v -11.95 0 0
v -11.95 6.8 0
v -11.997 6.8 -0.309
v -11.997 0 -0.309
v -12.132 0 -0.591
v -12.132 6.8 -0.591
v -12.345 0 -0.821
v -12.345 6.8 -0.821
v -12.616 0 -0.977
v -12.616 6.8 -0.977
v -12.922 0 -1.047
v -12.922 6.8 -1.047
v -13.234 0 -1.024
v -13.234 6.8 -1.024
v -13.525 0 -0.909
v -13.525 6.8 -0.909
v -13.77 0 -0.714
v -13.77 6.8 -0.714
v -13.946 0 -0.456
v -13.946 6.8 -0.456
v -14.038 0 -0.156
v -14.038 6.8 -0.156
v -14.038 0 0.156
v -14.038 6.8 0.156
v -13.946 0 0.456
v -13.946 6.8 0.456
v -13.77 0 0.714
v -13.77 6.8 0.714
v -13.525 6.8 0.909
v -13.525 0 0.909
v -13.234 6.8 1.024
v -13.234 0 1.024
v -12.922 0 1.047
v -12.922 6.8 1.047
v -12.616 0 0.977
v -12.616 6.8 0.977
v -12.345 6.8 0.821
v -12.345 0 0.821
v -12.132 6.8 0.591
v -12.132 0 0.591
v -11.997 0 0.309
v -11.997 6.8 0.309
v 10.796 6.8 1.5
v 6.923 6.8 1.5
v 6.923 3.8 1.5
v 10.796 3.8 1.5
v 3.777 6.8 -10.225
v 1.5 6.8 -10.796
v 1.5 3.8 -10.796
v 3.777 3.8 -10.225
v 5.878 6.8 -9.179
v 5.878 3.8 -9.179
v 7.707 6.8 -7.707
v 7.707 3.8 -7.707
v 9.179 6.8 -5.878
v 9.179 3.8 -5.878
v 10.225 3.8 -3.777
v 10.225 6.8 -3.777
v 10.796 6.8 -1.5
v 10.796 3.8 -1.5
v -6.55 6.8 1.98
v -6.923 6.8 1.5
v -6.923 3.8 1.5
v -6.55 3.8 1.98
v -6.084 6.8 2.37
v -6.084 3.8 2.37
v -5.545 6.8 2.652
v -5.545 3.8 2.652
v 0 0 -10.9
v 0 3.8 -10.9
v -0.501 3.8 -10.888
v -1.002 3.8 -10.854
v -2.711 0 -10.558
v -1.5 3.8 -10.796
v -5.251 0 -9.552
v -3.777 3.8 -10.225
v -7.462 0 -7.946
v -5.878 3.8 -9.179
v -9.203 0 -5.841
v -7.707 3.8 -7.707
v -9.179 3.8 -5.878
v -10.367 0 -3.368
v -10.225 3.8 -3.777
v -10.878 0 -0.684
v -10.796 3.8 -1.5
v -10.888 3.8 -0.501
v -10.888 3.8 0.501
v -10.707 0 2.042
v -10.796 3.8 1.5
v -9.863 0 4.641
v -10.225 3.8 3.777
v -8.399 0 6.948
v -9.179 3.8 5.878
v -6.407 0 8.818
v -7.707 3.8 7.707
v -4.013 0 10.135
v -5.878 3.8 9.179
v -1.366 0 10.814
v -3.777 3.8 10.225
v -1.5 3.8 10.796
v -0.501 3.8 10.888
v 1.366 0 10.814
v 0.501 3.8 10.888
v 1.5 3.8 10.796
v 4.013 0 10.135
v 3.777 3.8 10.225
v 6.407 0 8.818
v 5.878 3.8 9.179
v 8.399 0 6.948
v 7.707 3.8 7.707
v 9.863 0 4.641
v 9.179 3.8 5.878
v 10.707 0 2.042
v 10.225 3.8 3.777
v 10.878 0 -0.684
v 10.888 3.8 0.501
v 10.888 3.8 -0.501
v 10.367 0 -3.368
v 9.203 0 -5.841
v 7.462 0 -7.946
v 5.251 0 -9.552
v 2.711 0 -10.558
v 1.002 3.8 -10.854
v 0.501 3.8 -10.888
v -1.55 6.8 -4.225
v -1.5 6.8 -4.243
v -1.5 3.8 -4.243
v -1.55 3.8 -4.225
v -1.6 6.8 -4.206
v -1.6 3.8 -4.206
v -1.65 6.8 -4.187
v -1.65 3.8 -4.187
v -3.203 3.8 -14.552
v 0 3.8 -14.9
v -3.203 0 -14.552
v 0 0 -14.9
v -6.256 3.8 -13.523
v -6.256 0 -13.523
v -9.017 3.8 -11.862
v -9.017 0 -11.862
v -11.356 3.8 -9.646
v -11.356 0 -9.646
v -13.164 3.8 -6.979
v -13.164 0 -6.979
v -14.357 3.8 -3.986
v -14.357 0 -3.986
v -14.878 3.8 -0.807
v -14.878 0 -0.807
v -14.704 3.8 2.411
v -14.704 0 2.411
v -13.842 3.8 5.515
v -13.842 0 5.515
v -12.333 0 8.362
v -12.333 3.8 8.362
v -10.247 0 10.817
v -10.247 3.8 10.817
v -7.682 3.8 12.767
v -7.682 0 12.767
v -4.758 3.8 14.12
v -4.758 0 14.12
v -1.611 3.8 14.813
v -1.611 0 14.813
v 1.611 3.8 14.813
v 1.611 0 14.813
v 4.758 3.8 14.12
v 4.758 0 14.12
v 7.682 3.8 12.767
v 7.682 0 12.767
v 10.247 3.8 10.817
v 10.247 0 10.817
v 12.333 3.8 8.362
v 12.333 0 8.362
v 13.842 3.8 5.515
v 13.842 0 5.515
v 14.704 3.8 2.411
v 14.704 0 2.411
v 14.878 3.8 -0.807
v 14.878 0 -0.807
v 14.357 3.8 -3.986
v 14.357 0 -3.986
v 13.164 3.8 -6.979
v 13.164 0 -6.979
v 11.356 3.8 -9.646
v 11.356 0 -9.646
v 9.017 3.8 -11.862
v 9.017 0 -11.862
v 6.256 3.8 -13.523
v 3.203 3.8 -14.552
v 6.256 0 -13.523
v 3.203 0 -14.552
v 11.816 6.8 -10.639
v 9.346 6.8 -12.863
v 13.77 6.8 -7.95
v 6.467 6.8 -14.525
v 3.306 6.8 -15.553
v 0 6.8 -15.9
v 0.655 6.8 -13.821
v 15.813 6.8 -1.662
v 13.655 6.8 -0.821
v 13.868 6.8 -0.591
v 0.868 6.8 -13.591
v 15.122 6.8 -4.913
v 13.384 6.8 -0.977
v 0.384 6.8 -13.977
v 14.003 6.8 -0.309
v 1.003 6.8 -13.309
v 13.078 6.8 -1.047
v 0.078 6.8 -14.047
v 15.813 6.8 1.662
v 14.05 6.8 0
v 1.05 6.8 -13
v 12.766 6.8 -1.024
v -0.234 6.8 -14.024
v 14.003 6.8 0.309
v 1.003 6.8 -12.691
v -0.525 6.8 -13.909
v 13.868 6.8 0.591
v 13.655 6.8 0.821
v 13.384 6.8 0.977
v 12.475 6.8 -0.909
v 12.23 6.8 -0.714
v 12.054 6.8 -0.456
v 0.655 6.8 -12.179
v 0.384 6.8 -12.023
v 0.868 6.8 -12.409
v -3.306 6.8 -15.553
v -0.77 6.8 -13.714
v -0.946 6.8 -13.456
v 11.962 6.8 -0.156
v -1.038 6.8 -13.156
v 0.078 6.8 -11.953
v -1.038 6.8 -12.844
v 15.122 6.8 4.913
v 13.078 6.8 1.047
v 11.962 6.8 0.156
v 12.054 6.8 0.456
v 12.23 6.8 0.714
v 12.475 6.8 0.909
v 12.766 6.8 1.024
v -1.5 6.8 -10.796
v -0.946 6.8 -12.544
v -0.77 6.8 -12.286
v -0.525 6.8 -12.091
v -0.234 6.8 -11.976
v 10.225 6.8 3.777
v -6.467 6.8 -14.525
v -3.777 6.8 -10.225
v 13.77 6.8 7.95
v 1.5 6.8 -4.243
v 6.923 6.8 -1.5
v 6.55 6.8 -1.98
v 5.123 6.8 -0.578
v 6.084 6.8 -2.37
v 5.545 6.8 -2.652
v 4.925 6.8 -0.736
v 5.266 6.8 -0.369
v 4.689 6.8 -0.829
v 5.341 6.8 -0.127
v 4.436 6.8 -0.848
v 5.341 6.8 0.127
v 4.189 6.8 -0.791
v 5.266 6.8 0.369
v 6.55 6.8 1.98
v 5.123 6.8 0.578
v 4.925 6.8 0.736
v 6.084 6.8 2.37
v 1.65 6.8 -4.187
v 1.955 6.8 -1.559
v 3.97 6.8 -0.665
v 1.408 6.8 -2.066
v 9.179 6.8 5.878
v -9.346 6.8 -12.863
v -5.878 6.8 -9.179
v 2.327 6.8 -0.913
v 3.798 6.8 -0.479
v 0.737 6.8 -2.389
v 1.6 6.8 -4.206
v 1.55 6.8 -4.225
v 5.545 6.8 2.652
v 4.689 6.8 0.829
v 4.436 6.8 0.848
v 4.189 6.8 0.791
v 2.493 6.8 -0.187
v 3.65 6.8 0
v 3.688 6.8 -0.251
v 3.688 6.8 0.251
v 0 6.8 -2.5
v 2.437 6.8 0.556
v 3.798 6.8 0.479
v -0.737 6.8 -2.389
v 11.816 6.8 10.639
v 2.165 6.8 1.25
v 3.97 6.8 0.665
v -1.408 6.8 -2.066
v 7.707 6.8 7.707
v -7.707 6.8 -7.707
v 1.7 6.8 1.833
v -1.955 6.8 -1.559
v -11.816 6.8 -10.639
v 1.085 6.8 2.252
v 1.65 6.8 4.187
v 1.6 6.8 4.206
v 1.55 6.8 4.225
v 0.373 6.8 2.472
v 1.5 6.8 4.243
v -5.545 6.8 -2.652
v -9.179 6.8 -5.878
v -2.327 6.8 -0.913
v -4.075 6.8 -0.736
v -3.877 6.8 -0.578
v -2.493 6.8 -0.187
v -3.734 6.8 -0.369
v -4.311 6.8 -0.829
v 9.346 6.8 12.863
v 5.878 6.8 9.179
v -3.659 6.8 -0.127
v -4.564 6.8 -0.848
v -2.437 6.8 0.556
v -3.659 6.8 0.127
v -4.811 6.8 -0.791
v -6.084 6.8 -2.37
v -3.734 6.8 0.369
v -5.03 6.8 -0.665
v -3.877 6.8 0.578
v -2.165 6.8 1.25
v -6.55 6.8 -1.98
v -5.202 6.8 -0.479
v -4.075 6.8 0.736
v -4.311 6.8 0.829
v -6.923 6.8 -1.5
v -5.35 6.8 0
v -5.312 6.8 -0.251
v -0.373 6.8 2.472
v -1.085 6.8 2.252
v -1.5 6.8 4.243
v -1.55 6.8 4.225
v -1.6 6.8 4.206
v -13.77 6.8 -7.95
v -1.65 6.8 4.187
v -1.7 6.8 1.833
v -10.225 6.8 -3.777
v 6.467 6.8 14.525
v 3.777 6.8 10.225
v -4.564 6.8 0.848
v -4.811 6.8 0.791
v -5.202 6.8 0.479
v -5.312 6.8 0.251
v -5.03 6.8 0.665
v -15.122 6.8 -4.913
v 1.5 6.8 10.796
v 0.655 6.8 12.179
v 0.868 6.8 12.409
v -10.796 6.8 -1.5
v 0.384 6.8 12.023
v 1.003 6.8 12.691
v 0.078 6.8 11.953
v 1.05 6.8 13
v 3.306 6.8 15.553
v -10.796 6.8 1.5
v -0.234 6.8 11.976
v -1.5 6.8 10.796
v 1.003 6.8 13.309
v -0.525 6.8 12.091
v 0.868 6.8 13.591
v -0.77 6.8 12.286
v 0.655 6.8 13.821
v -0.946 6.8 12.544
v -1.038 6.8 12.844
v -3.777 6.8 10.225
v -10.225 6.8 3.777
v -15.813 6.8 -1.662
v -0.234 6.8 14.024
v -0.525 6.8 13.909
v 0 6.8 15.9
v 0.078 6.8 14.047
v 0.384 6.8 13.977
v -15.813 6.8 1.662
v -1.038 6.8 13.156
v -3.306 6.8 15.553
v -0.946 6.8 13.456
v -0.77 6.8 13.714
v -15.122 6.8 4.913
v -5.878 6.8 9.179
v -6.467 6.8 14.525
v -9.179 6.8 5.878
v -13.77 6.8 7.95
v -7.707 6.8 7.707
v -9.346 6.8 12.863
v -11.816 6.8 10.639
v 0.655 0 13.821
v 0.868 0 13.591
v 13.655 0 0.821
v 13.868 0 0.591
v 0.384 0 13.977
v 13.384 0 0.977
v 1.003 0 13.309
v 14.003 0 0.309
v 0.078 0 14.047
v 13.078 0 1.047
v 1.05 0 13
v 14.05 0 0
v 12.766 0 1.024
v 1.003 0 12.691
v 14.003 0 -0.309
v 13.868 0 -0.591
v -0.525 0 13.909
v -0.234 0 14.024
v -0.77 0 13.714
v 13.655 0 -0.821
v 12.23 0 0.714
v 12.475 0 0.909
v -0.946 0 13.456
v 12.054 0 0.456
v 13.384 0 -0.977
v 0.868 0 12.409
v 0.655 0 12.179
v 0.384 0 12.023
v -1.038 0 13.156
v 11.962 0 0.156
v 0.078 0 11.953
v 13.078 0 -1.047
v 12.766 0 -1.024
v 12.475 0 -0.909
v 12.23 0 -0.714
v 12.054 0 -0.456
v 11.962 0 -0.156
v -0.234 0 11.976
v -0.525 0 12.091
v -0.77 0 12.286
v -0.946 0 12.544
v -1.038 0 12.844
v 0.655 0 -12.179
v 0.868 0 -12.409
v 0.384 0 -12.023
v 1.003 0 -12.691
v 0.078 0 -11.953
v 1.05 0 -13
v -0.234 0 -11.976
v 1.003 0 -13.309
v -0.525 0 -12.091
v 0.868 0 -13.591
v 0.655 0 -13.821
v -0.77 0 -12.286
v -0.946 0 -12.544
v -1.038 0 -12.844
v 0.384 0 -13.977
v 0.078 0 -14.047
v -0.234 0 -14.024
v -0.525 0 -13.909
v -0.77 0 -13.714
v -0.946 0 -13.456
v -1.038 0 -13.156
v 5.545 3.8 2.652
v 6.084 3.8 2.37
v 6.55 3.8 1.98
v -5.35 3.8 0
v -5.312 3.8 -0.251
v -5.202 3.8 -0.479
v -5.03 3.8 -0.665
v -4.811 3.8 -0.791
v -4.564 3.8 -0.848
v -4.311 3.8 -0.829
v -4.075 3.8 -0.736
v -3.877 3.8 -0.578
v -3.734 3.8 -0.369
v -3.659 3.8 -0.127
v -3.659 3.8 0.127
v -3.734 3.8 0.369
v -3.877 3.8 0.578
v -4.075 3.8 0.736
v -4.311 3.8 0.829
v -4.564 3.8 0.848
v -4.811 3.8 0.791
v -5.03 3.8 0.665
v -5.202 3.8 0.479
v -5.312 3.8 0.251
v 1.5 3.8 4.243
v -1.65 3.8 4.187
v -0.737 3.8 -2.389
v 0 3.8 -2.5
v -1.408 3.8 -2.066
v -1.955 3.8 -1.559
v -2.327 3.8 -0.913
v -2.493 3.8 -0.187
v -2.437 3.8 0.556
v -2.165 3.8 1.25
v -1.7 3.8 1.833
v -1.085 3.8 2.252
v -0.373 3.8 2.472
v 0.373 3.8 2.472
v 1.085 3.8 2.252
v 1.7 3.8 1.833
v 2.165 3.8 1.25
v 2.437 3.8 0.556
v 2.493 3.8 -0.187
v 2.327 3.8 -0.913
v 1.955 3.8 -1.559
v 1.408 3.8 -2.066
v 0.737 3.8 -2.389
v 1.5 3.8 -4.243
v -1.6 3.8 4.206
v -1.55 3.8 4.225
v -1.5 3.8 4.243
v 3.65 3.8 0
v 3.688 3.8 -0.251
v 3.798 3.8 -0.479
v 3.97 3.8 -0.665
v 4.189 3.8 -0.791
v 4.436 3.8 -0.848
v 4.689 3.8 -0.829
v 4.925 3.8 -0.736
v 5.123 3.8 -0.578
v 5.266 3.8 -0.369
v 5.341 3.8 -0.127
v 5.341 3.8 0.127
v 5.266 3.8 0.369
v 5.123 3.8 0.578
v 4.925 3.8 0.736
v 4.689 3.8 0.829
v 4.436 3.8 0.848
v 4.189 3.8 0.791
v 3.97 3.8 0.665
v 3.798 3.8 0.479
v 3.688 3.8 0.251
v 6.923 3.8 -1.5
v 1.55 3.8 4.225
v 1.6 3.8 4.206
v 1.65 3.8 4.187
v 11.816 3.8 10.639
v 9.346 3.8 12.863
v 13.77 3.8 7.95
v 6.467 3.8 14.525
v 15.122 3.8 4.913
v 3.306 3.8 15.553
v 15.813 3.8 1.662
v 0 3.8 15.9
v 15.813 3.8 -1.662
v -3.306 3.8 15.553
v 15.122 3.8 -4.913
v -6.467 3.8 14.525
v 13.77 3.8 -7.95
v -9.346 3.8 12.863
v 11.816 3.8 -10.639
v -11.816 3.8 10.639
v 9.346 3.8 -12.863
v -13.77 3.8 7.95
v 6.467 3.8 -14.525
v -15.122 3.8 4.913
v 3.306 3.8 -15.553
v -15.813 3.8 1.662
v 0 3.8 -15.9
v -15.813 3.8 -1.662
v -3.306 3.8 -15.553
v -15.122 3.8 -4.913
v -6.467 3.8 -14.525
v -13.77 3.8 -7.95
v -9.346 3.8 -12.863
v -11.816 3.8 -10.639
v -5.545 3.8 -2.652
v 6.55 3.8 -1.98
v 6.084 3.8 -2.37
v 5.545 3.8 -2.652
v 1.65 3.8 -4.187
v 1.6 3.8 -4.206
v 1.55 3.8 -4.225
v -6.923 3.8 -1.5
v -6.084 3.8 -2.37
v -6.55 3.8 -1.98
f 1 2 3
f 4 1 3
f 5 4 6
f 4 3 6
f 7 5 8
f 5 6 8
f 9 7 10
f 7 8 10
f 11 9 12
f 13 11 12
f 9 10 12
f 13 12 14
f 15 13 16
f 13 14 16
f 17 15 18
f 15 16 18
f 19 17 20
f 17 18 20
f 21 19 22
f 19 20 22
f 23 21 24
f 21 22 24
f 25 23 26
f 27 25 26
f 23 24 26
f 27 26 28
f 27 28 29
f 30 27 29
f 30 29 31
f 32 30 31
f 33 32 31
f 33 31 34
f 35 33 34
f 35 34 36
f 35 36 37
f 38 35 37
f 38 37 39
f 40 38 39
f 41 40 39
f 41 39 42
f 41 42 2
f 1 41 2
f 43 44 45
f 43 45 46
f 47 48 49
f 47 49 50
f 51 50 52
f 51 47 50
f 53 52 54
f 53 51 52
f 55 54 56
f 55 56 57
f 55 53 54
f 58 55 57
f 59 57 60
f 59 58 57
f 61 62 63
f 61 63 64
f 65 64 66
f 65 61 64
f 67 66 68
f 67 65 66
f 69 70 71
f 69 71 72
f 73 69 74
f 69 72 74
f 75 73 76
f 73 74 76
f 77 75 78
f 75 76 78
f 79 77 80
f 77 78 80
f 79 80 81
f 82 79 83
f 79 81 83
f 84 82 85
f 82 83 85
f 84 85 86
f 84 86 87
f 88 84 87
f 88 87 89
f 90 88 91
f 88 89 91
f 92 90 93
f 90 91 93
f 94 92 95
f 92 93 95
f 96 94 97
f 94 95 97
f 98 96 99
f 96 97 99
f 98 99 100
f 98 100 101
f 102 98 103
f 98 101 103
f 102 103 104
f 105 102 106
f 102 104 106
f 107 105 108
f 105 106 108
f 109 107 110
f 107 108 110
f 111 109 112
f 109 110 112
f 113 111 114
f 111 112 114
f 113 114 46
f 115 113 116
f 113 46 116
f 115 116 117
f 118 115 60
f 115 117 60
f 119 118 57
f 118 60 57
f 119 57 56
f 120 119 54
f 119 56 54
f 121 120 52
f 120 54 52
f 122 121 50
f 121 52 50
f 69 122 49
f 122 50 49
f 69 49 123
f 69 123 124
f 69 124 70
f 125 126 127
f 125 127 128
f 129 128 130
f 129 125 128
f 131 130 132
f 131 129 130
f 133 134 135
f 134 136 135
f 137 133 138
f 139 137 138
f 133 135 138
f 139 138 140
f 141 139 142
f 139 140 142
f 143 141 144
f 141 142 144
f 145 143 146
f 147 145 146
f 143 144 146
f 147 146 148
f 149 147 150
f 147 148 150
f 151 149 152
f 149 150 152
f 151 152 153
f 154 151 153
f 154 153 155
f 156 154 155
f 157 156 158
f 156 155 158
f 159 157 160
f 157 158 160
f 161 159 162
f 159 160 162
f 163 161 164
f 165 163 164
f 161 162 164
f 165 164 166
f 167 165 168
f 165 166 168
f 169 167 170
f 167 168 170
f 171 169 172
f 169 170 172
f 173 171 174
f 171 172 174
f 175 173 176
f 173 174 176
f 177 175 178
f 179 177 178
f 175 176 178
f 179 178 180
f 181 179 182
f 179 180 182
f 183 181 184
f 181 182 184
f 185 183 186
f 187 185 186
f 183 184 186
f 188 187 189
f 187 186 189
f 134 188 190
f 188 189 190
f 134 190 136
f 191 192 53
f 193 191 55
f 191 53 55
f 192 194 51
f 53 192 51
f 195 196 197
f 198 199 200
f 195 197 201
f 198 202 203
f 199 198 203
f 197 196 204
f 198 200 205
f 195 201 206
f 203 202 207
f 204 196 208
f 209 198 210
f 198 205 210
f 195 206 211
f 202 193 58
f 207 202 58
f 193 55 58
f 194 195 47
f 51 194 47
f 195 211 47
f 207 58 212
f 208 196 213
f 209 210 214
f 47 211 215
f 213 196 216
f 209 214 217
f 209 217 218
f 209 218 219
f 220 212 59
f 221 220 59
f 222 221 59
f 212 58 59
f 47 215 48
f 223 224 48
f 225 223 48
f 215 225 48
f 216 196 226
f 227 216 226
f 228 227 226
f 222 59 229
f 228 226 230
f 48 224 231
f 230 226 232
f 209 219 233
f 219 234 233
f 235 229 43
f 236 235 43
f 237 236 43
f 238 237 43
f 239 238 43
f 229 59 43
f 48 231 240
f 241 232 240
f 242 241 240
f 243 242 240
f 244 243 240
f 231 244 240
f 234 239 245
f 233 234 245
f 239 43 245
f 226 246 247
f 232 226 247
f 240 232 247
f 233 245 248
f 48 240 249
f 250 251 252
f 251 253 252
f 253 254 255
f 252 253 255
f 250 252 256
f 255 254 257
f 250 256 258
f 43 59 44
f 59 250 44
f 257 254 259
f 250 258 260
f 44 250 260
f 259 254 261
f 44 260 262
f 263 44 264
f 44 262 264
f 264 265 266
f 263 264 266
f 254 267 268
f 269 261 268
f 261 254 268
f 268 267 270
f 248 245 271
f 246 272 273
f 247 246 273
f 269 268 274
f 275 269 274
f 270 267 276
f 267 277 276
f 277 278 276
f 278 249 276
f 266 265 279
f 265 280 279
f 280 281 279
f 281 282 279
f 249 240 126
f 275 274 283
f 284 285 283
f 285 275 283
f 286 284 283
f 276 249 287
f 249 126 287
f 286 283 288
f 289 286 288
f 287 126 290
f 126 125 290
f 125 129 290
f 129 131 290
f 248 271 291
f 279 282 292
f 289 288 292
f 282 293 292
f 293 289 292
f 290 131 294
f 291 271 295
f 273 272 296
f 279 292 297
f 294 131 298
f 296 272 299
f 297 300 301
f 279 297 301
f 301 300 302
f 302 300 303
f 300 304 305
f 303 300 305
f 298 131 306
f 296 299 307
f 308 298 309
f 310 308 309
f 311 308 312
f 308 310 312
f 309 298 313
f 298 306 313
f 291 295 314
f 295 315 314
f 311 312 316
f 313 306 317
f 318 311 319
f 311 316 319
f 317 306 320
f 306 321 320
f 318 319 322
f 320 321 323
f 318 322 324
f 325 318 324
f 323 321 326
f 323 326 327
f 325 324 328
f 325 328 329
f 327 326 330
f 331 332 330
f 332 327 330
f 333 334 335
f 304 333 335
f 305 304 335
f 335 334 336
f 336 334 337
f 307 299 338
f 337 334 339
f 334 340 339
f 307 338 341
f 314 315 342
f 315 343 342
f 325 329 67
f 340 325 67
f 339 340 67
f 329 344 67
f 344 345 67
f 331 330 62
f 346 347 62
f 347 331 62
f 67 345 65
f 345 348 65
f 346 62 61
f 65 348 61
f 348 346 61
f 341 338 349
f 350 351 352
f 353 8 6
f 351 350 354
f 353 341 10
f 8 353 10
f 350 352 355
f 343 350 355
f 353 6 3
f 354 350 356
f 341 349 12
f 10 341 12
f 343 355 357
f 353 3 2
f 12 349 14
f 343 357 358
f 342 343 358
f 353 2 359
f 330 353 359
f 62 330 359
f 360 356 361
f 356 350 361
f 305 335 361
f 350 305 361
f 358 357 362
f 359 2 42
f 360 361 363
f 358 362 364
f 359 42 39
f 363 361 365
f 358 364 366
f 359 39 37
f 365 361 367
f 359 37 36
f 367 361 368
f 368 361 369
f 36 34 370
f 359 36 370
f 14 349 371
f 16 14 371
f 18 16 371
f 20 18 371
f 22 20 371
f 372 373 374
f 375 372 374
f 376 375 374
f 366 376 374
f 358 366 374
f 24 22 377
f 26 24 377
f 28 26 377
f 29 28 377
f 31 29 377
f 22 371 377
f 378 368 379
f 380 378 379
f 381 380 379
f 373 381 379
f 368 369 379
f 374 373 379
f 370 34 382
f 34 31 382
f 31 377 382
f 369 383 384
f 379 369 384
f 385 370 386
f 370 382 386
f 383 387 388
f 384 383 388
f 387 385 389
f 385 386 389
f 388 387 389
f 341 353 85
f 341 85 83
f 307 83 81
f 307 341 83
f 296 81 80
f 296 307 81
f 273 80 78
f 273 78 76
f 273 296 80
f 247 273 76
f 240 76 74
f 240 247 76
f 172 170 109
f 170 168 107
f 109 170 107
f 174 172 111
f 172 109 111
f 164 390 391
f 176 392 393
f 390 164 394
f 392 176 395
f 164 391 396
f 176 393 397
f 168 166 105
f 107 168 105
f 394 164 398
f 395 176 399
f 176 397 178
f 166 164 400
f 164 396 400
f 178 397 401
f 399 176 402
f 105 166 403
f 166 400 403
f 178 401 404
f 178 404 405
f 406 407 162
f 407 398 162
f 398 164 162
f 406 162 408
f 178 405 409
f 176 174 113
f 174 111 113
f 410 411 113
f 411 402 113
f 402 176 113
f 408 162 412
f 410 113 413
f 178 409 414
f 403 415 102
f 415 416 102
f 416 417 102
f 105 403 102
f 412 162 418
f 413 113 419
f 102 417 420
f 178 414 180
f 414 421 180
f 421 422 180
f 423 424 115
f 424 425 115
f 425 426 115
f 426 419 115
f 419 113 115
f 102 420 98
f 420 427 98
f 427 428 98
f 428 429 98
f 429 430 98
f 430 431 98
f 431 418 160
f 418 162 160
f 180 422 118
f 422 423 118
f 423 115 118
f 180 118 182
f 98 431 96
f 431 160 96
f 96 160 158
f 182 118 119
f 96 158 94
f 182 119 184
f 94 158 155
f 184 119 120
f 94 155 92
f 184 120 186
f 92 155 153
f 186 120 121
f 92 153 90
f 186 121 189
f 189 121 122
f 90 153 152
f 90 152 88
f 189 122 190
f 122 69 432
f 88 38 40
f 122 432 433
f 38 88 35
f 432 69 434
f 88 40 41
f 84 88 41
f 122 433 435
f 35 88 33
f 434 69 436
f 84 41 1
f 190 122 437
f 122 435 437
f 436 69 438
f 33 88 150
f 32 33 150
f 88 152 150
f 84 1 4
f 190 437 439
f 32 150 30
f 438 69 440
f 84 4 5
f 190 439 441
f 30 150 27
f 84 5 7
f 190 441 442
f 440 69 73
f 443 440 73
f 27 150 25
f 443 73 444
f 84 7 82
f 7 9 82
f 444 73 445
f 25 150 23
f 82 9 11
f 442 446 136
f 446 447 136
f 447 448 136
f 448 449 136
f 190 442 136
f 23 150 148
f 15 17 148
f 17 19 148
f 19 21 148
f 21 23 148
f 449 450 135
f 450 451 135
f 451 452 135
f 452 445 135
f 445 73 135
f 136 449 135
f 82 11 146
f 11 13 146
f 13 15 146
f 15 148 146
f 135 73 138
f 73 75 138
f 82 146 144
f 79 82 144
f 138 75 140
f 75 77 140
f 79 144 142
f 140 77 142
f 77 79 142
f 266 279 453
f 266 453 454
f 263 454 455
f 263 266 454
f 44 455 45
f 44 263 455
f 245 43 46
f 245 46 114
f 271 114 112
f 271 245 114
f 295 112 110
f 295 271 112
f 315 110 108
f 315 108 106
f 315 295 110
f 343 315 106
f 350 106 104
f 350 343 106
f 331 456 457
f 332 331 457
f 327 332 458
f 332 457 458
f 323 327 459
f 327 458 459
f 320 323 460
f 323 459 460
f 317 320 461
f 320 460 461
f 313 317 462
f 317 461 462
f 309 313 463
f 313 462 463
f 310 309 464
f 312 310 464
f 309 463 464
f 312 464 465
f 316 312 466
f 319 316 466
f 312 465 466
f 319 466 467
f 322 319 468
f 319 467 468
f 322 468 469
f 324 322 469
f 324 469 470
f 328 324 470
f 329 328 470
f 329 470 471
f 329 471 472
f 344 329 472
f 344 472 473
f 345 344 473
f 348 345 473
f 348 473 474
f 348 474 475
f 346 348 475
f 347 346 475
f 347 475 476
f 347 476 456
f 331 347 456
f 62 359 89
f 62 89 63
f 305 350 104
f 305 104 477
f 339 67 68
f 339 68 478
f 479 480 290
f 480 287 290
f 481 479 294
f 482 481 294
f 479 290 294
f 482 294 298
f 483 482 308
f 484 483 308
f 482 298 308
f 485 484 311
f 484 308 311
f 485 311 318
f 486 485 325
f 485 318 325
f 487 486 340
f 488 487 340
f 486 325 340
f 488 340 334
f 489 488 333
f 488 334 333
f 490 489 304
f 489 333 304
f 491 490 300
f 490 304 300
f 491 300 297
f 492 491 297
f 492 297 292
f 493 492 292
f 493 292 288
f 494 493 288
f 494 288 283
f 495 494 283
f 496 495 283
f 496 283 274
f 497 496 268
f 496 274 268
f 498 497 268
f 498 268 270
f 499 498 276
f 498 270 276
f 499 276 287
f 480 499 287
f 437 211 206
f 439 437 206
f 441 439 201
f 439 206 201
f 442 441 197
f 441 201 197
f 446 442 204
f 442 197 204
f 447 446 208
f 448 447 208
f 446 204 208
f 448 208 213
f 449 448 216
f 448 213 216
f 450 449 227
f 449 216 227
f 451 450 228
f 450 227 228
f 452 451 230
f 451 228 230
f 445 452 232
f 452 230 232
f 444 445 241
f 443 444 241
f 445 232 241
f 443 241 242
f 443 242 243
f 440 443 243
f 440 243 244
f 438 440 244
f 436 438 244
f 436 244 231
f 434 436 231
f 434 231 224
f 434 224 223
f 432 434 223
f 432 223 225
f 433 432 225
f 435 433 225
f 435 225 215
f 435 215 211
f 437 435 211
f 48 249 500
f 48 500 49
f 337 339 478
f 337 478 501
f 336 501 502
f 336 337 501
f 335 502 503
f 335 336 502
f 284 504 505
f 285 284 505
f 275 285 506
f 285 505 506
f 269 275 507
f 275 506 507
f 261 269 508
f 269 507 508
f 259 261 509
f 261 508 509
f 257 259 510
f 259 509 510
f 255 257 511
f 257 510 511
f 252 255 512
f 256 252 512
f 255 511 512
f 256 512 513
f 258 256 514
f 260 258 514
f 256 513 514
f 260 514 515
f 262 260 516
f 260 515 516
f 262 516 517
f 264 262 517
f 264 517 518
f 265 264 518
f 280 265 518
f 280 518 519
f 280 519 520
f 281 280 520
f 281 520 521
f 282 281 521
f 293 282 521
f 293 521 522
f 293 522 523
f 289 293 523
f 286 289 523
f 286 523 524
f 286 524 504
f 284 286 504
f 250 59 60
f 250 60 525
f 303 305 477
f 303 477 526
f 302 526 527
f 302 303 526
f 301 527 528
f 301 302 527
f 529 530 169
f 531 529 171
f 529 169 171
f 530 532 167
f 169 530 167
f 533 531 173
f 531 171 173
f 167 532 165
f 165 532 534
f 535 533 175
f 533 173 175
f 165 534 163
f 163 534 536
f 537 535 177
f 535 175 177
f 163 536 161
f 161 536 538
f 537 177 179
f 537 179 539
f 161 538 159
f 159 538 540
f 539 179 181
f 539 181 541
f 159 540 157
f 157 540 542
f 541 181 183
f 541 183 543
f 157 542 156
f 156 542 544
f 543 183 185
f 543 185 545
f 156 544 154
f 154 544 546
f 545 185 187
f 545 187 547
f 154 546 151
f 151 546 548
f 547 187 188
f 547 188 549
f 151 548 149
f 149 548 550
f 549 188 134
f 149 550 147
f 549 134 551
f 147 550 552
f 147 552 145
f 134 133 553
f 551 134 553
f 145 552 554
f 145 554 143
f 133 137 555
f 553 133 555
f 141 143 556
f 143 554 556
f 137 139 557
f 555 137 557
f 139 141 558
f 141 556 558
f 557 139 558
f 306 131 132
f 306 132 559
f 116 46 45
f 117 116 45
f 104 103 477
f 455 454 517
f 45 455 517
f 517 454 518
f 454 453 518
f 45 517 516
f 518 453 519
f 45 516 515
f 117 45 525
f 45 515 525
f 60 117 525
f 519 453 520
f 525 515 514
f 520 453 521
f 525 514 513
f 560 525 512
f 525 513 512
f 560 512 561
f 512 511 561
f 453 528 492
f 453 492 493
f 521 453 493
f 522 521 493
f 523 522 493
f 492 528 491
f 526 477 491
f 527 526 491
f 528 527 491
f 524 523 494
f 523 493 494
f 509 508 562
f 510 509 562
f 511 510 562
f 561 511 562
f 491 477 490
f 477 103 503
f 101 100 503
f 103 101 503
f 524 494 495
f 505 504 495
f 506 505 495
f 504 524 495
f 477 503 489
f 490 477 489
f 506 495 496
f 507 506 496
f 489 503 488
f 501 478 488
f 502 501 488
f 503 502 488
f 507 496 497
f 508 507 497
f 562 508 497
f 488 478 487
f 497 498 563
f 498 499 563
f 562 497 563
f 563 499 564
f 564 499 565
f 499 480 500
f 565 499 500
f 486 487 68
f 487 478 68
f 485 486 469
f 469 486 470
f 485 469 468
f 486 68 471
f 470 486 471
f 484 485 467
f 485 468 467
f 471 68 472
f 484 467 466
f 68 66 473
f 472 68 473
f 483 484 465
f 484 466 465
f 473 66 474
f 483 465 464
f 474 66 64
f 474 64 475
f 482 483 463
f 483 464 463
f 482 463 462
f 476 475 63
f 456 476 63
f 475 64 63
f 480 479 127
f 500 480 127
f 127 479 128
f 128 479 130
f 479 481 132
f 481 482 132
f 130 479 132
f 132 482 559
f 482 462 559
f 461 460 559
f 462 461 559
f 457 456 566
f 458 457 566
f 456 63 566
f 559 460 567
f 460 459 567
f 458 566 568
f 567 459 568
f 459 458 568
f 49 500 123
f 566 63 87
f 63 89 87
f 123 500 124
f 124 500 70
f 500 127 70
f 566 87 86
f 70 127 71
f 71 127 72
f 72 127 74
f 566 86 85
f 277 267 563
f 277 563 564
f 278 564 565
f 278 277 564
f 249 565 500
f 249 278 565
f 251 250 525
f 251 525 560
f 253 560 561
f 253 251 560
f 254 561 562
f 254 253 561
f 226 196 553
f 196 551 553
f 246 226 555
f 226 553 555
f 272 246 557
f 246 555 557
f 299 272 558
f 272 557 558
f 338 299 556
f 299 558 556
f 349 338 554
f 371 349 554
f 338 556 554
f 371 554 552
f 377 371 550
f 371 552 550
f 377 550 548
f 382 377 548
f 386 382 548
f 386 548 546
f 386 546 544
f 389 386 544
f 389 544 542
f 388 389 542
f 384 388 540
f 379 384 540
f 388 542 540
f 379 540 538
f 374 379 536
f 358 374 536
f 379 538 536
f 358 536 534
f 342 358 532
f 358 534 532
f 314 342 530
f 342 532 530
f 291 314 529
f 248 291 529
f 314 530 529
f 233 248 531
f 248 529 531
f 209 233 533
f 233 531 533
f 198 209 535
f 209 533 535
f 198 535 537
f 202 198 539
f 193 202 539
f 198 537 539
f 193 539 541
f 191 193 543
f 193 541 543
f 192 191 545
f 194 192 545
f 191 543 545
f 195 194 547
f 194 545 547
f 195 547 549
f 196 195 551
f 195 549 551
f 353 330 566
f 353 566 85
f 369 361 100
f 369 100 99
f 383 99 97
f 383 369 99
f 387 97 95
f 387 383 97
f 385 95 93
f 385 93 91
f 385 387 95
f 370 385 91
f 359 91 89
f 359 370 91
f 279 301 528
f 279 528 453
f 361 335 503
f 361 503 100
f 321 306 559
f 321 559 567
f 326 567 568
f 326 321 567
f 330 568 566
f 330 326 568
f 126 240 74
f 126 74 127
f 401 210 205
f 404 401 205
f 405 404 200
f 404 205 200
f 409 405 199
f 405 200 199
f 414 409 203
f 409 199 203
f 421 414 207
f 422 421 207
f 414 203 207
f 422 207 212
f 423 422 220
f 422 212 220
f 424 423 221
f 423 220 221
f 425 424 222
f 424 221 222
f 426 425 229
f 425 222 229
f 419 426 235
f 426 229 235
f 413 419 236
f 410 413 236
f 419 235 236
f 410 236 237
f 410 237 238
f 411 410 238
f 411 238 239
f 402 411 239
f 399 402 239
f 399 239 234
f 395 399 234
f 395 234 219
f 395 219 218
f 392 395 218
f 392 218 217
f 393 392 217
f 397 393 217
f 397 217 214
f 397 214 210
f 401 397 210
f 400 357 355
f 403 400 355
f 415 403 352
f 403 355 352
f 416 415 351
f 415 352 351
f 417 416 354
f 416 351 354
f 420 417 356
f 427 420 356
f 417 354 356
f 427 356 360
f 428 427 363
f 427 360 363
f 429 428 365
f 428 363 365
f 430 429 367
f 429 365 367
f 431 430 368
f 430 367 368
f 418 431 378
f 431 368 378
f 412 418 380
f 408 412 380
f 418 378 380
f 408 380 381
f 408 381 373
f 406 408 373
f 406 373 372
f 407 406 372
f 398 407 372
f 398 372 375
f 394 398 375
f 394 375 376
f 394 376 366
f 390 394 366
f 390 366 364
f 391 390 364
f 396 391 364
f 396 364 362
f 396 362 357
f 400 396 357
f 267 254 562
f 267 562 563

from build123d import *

# Parameters (mm, degrees)
HOLE_WIZARD_1_7_1_7_1_D     = 1.7
HOLE_WIZARD_1_7_1_7_1_DEPTH = 6
HOLE_WIZARD_2_1_2_1_1_D     = 2.1
CUT_EXTRUDE_START           = -10
CUT_EXTRUDE_1_DEPTH         = 10


with BuildPart() as part:
    # 草图2 → 旋转1 (revolve)
    with BuildSketch(Plane.XY, mode=Mode.PRIVATE) as revolve_1_sk:
        Polygon((2.5, 6.8), (15.9, 6.8), (15.9, 3.8), (14.9, 3.8), (14.9, 0), (10.9, 0), (10.9, 3.8), (2.5, 3.8), align=None)
    revolve(revolve_1_sk.sketch.rotate(Axis((0, 0, 0), (0, 1, 0)), 90), axis=Axis((0, 0, 0), (0, 1, 0)))

    # Ø1.7 (1.7) 直径孔1
    with Locations(Plane(origin=(0, 6.8, 0), x_dir=(1, 0, 0), z_dir=(0, 1, 0))):
        with Locations((-4.5, 0), (4.5, 0)):
            Hole(HOLE_WIZARD_1_7_1_7_1_D / 2, depth=HOLE_WIZARD_1_7_1_7_1_DEPTH)

    # Ø2.1 (2.1) 直径孔1 (through all)
    with Locations(Plane(origin=(0, 0, 0), x_dir=(-1, 0, 0), z_dir=(0, -1, 0))):
        with Locations((-13, 0), (0, 13), (13, 0), (0, -13)):
            Hole(HOLE_WIZARD_2_1_2_1_1_D / 2)

    # 草图9 → 切除-拉伸1 (cut)
    with BuildSketch(Plane.XZ.offset(-3.8).offset(CUT_EXTRUDE_START)):
        with BuildLine():
            Line((-5.545, 2.65150429), (-1.65, 4.186585721))
            ThreePointArc((-1.65, 4.186585721), (-1.575249358, 4.215280472), (-1.5, 4.242640687))
            Line((-1.5, 4.242640687), (-1.5, 10.796295661))
            ThreePointArc((-1.5, 10.796295661), (-7.707463915, 7.707463915), (-10.796295661, 1.5))
            Line((-10.796295661, 1.5), (-6.923324163, 1.5))
            ThreePointArc((-6.923324163, 1.5), (-6.327240722, 2.187165138), (-5.545, 2.65150429))
        make_face()
        with BuildLine():
            ThreePointArc((-5.545, -2.65150429), (-6.327240722, -2.187165138), (-6.923324163, -1.5))
            Line((-6.923324163, -1.5), (-10.796295661, -1.5))
            ThreePointArc((-10.796295661, -1.5), (-7.707463915, -7.707463915), (-1.5, -10.796295661))
            Line((-1.5, -10.796295661), (-1.5, -4.242640687))
            ThreePointArc((-1.5, -4.242640687), (-1.575249358, -4.215280472), (-1.65, -4.186585721))
            Line((-1.65, -4.186585721), (-5.545, -2.65150429))
        make_face()
        with BuildLine():
            Line((1.5, 10.796295661), (1.5, 4.242640687))
            ThreePointArc((1.5, 4.242640687), (1.575249358, 4.215280472), (1.65, 4.186585721))
            Line((1.65, 4.186585721), (5.545, 2.65150429))
            ThreePointArc((5.545, 2.65150429), (6.327240722, 2.187165138), (6.923324163, 1.5))
            Line((6.923324163, 1.5), (10.796295661, 1.5))
            ThreePointArc((10.796295661, 1.5), (7.707463915, 7.707463915), (1.5, 10.796295661))
        make_face()
        with BuildLine():
            ThreePointArc((1.65, -4.186585721), (1.575249358, -4.215280472), (1.5, -4.242640687))
            Line((1.5, -4.242640687), (1.5, -10.796295661))
            ThreePointArc((1.5, -10.796295661), (7.707463915, -7.707463915), (10.796295661, -1.5))
            Line((10.796295661, -1.5), (6.923324163, -1.5))
            ThreePointArc((6.923324163, -1.5), (6.327240722, -2.187165138), (5.545, -2.65150429))
            Line((5.545, -2.65150429), (1.65, -4.186585721))
        make_face()
    extrude(amount=CUT_EXTRUDE_1_DEPTH, mode=Mode.SUBTRACT)


solid = part.part
